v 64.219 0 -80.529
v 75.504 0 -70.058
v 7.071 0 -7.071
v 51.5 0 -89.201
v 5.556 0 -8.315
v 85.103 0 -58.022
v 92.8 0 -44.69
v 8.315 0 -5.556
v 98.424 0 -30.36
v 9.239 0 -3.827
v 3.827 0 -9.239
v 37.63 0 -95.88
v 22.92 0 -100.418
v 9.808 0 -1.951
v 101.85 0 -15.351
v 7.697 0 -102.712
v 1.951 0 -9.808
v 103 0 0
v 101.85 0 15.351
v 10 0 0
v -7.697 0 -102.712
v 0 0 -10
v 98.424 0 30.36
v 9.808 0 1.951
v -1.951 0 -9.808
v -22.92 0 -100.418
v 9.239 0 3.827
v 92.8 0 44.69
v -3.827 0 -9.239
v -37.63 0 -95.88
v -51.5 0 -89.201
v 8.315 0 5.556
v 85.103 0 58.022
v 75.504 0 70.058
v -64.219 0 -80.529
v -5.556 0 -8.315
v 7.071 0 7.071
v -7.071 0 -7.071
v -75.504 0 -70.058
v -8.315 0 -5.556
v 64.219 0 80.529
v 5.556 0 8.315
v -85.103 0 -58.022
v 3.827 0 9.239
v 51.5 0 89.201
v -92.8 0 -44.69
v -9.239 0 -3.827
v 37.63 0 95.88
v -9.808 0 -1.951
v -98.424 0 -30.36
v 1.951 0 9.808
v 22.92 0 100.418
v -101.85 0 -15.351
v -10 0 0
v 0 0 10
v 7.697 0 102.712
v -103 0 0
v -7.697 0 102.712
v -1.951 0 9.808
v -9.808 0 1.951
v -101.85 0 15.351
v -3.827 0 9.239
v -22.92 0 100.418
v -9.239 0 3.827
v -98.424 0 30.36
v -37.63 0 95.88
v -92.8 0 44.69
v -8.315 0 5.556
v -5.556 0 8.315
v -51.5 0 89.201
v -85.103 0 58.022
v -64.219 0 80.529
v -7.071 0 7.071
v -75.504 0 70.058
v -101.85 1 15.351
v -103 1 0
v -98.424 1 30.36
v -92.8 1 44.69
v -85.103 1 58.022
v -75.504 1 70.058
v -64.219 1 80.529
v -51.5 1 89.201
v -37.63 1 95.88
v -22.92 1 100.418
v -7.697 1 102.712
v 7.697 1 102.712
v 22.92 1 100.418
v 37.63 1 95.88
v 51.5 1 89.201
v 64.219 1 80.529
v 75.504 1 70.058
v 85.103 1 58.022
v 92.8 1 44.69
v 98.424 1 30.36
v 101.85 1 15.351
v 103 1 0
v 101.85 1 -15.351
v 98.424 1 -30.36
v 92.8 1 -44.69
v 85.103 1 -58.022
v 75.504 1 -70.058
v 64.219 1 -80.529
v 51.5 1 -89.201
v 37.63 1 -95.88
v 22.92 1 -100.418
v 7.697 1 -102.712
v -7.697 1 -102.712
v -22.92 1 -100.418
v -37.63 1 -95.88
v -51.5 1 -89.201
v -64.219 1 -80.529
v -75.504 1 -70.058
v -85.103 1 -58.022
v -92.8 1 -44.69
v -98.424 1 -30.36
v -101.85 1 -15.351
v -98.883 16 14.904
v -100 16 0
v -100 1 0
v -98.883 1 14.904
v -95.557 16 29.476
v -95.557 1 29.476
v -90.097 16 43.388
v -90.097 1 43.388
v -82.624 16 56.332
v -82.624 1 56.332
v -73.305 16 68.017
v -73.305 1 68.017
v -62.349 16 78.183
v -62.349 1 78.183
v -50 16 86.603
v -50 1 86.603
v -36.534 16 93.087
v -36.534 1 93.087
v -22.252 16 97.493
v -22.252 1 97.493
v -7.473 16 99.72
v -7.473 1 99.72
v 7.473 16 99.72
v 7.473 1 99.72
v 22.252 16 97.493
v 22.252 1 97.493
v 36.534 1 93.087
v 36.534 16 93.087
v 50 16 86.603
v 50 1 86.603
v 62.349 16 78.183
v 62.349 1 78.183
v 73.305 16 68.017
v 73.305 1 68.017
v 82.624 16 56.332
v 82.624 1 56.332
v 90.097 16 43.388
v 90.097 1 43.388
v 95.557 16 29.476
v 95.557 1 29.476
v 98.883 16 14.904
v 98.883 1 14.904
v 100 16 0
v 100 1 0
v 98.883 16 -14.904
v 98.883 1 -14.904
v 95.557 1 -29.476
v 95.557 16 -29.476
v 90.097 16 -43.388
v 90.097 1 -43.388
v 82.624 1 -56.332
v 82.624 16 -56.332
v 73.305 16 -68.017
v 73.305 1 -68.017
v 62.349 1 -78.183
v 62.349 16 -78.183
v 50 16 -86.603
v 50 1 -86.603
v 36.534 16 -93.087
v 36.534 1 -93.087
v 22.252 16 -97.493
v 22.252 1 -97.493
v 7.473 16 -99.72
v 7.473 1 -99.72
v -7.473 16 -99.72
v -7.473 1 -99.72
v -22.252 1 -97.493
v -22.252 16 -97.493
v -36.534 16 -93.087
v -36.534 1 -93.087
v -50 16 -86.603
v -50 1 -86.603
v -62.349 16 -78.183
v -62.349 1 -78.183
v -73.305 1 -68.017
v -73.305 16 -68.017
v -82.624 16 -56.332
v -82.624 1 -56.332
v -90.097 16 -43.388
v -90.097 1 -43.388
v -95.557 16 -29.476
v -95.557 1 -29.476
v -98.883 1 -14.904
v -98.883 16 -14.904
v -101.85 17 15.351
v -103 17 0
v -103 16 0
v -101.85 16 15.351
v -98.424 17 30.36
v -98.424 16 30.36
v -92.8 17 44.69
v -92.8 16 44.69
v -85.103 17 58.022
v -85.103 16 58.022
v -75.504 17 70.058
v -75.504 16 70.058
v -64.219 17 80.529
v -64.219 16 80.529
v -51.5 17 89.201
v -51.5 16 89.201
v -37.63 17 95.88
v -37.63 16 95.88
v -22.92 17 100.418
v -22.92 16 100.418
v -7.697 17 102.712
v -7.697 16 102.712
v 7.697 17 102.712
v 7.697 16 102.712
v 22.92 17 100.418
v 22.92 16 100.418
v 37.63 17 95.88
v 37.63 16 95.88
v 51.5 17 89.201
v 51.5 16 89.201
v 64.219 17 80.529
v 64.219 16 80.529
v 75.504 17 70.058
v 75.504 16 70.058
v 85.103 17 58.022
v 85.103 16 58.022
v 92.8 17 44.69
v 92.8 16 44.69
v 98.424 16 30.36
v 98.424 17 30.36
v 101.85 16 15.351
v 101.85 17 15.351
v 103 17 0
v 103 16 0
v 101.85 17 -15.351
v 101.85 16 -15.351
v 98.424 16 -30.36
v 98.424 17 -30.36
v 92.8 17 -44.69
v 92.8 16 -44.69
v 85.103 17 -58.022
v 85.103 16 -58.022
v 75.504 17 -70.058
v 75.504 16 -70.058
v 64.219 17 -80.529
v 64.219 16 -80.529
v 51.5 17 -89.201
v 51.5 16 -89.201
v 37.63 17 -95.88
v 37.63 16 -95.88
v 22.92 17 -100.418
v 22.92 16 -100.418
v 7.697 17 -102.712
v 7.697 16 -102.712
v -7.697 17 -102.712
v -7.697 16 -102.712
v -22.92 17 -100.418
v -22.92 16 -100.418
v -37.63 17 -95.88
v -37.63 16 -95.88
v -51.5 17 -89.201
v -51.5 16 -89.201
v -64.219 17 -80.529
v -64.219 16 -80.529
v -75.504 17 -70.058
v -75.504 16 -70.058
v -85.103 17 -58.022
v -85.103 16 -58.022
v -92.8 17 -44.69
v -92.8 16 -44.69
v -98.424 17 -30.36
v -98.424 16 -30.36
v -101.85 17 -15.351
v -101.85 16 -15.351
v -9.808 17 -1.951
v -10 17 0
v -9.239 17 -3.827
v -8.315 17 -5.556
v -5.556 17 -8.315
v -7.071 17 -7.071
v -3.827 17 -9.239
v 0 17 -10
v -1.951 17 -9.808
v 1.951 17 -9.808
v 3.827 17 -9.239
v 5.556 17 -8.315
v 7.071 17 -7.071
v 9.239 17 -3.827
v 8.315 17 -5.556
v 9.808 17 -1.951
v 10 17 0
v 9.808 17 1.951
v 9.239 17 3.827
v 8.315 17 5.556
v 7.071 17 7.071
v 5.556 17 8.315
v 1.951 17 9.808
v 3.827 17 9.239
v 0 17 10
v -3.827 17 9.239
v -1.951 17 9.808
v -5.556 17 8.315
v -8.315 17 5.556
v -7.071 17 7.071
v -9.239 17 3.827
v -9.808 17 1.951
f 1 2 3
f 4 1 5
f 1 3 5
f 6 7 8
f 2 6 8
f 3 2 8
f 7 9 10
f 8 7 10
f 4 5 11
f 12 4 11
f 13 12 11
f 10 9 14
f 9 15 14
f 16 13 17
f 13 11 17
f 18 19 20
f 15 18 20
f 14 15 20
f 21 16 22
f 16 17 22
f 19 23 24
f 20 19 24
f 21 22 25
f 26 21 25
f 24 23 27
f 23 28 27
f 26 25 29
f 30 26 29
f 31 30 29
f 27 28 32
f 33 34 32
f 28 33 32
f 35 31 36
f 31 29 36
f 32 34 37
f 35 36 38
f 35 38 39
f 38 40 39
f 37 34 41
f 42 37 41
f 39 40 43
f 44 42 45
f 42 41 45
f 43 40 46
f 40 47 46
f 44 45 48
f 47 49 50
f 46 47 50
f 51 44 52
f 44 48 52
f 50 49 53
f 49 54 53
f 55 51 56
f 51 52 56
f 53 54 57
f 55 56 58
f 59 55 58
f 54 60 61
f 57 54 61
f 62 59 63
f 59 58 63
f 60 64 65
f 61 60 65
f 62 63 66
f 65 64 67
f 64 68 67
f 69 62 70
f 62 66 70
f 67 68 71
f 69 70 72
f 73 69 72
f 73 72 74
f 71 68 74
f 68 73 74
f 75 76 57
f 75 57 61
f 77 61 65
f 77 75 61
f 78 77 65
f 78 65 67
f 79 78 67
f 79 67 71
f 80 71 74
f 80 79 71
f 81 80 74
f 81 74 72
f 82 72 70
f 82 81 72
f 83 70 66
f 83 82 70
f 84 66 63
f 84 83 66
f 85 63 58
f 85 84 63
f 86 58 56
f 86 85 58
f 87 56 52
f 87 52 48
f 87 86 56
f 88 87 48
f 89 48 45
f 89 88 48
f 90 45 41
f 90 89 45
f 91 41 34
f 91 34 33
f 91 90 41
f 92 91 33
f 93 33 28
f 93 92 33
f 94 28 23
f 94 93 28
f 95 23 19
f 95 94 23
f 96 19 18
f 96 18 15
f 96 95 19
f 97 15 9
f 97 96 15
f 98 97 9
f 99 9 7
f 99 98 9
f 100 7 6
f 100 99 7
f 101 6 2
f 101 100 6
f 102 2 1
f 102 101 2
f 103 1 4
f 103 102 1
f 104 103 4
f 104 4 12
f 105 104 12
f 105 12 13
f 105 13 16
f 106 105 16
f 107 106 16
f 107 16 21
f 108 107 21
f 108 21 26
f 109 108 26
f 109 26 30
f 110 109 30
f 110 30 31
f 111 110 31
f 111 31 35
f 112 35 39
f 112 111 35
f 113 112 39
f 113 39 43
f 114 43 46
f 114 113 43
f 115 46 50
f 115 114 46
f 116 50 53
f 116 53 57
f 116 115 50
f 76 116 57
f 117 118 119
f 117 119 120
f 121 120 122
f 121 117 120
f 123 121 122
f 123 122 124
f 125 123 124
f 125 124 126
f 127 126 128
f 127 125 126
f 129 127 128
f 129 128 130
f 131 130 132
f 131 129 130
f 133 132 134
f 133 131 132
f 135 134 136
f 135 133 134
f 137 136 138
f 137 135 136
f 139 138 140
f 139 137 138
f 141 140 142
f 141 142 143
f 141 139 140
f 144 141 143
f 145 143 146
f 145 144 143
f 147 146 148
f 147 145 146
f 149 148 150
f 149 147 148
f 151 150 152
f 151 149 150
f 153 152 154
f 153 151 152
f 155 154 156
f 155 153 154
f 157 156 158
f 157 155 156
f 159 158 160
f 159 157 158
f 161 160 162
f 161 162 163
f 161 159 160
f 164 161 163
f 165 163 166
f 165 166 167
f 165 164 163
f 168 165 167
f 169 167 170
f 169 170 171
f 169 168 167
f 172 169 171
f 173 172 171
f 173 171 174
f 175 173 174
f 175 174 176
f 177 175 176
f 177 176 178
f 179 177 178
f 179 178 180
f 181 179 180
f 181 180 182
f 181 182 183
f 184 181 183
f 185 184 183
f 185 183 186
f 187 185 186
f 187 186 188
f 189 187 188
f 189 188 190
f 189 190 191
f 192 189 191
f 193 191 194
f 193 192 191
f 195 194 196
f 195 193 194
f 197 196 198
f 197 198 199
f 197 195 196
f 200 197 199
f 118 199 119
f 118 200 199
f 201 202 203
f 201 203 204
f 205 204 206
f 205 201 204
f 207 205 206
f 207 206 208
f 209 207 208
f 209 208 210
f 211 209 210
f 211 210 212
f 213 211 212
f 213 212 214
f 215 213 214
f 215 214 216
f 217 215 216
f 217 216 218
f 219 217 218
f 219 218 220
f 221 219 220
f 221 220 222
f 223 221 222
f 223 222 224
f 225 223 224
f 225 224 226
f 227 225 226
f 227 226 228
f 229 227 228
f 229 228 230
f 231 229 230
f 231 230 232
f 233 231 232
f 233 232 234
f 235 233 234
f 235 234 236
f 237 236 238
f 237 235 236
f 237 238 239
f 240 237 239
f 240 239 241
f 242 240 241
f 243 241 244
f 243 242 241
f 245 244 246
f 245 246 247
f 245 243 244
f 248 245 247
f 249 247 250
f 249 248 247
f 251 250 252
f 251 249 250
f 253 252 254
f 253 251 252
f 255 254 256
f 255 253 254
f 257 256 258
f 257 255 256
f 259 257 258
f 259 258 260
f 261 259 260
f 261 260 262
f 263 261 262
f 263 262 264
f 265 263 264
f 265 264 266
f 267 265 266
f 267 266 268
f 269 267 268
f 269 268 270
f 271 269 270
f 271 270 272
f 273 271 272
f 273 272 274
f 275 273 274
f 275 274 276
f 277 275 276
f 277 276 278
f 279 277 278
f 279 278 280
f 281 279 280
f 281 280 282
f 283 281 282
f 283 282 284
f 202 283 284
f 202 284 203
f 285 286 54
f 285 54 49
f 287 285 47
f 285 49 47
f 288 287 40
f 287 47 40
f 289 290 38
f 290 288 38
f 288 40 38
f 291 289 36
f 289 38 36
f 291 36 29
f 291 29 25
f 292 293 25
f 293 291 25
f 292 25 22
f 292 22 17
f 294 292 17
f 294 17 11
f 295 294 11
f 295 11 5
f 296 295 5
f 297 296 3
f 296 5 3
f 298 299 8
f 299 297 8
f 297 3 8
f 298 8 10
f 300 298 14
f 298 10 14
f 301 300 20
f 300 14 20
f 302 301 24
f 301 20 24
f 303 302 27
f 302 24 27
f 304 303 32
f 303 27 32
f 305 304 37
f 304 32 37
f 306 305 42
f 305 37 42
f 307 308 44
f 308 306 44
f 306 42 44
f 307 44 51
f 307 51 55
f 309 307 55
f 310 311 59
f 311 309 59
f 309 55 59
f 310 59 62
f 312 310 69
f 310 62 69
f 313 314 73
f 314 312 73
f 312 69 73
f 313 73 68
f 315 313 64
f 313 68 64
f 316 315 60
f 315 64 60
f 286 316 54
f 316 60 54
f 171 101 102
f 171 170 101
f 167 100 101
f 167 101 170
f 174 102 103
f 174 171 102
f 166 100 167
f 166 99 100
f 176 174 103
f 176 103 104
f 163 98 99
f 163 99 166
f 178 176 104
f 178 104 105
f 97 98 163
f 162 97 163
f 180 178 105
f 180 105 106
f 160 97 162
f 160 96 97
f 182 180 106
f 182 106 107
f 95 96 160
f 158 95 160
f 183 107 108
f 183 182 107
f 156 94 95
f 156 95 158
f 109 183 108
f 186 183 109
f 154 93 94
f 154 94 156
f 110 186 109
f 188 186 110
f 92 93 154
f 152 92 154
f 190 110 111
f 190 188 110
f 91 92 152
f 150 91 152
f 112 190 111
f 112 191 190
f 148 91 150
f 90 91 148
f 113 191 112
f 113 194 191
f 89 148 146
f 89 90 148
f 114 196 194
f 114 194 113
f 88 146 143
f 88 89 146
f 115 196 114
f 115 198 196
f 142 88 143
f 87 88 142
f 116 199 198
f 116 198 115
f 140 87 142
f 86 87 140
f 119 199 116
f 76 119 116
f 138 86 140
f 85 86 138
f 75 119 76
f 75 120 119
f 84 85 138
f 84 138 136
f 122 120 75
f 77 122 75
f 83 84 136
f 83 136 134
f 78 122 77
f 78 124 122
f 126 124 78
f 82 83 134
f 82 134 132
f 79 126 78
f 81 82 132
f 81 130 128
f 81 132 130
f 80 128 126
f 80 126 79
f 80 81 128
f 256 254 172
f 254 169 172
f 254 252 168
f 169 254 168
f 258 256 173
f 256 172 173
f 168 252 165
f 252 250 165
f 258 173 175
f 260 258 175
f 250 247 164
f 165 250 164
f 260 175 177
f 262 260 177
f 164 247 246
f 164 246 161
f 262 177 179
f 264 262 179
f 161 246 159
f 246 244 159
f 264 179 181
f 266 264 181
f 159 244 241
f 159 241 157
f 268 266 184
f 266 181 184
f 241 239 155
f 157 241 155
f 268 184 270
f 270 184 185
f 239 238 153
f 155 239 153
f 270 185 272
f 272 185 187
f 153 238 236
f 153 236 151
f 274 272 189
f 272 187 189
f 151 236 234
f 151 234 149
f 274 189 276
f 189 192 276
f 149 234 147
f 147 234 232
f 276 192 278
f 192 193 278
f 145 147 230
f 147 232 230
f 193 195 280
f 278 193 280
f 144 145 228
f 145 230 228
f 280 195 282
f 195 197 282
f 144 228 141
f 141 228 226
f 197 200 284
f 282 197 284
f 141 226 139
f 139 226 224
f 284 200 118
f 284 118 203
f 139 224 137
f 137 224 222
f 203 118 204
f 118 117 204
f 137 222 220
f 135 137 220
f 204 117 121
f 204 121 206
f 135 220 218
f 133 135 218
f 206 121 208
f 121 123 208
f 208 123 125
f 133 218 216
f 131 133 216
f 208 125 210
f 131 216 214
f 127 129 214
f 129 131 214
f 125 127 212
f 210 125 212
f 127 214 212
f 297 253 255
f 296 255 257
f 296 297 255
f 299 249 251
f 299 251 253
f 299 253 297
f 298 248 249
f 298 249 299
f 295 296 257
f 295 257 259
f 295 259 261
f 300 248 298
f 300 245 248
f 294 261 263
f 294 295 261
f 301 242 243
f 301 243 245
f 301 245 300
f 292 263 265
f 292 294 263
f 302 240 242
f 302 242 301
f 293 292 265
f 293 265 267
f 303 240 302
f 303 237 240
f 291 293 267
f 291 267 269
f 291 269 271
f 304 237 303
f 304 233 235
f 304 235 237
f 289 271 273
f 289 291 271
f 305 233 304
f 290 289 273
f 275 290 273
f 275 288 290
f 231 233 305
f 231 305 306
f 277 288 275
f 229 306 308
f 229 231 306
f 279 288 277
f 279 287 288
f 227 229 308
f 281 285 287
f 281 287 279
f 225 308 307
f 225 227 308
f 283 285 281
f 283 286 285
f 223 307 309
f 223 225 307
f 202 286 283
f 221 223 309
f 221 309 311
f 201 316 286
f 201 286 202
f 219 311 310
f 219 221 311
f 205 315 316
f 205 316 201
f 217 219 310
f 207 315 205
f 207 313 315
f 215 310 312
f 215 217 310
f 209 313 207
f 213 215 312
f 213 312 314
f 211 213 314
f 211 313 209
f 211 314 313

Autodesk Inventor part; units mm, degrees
ref_plane "YZ Plane" through (0, 0, 0) normal (1, 0, 0) x (0, 1, 0)
ref_plane "XZ Plane" through (0, 0, 0) normal (0, 1, 0) x (-1, 0, 0)
ref_plane "XY Plane" through (0, 0, 0) normal (0, 0, 1) x (1, 0, 0)
sketch "Sketch1" plane through (0, 0, 0) normal (0, 0, 1) x (1, 0, 0)
  line L0 (0, 0) -> (-103, 0)
  line L1 (-103, 0) -> (-103, 1)
  line L2 (-103, 1) -> (-100, 1)
  line L3 (-100, 1) -> (-100, 16)
  line L4 (-100, 16) -> (-103, 16)
  line L5 (-103, 16) -> (-103, 17)
  line L6 (-103, 17) -> (-10, 17)
  line L7 (-10, 17) -> (-10, 0)
  line L8 (0, 0) -> (0, 15.4715) construction
  dimension "d0" = 100
  dimension "d1" = 15
  dimension "d2" = 1
  dimension "d3" = 1
  dimension "d4" = 10
  dimension "d5" = 3
revolve "Revolution1" add sketch "Sketch1" angle 360 about axis through (0, 0, 0) along (0, 1, 0)
properties part number "fakepully"
